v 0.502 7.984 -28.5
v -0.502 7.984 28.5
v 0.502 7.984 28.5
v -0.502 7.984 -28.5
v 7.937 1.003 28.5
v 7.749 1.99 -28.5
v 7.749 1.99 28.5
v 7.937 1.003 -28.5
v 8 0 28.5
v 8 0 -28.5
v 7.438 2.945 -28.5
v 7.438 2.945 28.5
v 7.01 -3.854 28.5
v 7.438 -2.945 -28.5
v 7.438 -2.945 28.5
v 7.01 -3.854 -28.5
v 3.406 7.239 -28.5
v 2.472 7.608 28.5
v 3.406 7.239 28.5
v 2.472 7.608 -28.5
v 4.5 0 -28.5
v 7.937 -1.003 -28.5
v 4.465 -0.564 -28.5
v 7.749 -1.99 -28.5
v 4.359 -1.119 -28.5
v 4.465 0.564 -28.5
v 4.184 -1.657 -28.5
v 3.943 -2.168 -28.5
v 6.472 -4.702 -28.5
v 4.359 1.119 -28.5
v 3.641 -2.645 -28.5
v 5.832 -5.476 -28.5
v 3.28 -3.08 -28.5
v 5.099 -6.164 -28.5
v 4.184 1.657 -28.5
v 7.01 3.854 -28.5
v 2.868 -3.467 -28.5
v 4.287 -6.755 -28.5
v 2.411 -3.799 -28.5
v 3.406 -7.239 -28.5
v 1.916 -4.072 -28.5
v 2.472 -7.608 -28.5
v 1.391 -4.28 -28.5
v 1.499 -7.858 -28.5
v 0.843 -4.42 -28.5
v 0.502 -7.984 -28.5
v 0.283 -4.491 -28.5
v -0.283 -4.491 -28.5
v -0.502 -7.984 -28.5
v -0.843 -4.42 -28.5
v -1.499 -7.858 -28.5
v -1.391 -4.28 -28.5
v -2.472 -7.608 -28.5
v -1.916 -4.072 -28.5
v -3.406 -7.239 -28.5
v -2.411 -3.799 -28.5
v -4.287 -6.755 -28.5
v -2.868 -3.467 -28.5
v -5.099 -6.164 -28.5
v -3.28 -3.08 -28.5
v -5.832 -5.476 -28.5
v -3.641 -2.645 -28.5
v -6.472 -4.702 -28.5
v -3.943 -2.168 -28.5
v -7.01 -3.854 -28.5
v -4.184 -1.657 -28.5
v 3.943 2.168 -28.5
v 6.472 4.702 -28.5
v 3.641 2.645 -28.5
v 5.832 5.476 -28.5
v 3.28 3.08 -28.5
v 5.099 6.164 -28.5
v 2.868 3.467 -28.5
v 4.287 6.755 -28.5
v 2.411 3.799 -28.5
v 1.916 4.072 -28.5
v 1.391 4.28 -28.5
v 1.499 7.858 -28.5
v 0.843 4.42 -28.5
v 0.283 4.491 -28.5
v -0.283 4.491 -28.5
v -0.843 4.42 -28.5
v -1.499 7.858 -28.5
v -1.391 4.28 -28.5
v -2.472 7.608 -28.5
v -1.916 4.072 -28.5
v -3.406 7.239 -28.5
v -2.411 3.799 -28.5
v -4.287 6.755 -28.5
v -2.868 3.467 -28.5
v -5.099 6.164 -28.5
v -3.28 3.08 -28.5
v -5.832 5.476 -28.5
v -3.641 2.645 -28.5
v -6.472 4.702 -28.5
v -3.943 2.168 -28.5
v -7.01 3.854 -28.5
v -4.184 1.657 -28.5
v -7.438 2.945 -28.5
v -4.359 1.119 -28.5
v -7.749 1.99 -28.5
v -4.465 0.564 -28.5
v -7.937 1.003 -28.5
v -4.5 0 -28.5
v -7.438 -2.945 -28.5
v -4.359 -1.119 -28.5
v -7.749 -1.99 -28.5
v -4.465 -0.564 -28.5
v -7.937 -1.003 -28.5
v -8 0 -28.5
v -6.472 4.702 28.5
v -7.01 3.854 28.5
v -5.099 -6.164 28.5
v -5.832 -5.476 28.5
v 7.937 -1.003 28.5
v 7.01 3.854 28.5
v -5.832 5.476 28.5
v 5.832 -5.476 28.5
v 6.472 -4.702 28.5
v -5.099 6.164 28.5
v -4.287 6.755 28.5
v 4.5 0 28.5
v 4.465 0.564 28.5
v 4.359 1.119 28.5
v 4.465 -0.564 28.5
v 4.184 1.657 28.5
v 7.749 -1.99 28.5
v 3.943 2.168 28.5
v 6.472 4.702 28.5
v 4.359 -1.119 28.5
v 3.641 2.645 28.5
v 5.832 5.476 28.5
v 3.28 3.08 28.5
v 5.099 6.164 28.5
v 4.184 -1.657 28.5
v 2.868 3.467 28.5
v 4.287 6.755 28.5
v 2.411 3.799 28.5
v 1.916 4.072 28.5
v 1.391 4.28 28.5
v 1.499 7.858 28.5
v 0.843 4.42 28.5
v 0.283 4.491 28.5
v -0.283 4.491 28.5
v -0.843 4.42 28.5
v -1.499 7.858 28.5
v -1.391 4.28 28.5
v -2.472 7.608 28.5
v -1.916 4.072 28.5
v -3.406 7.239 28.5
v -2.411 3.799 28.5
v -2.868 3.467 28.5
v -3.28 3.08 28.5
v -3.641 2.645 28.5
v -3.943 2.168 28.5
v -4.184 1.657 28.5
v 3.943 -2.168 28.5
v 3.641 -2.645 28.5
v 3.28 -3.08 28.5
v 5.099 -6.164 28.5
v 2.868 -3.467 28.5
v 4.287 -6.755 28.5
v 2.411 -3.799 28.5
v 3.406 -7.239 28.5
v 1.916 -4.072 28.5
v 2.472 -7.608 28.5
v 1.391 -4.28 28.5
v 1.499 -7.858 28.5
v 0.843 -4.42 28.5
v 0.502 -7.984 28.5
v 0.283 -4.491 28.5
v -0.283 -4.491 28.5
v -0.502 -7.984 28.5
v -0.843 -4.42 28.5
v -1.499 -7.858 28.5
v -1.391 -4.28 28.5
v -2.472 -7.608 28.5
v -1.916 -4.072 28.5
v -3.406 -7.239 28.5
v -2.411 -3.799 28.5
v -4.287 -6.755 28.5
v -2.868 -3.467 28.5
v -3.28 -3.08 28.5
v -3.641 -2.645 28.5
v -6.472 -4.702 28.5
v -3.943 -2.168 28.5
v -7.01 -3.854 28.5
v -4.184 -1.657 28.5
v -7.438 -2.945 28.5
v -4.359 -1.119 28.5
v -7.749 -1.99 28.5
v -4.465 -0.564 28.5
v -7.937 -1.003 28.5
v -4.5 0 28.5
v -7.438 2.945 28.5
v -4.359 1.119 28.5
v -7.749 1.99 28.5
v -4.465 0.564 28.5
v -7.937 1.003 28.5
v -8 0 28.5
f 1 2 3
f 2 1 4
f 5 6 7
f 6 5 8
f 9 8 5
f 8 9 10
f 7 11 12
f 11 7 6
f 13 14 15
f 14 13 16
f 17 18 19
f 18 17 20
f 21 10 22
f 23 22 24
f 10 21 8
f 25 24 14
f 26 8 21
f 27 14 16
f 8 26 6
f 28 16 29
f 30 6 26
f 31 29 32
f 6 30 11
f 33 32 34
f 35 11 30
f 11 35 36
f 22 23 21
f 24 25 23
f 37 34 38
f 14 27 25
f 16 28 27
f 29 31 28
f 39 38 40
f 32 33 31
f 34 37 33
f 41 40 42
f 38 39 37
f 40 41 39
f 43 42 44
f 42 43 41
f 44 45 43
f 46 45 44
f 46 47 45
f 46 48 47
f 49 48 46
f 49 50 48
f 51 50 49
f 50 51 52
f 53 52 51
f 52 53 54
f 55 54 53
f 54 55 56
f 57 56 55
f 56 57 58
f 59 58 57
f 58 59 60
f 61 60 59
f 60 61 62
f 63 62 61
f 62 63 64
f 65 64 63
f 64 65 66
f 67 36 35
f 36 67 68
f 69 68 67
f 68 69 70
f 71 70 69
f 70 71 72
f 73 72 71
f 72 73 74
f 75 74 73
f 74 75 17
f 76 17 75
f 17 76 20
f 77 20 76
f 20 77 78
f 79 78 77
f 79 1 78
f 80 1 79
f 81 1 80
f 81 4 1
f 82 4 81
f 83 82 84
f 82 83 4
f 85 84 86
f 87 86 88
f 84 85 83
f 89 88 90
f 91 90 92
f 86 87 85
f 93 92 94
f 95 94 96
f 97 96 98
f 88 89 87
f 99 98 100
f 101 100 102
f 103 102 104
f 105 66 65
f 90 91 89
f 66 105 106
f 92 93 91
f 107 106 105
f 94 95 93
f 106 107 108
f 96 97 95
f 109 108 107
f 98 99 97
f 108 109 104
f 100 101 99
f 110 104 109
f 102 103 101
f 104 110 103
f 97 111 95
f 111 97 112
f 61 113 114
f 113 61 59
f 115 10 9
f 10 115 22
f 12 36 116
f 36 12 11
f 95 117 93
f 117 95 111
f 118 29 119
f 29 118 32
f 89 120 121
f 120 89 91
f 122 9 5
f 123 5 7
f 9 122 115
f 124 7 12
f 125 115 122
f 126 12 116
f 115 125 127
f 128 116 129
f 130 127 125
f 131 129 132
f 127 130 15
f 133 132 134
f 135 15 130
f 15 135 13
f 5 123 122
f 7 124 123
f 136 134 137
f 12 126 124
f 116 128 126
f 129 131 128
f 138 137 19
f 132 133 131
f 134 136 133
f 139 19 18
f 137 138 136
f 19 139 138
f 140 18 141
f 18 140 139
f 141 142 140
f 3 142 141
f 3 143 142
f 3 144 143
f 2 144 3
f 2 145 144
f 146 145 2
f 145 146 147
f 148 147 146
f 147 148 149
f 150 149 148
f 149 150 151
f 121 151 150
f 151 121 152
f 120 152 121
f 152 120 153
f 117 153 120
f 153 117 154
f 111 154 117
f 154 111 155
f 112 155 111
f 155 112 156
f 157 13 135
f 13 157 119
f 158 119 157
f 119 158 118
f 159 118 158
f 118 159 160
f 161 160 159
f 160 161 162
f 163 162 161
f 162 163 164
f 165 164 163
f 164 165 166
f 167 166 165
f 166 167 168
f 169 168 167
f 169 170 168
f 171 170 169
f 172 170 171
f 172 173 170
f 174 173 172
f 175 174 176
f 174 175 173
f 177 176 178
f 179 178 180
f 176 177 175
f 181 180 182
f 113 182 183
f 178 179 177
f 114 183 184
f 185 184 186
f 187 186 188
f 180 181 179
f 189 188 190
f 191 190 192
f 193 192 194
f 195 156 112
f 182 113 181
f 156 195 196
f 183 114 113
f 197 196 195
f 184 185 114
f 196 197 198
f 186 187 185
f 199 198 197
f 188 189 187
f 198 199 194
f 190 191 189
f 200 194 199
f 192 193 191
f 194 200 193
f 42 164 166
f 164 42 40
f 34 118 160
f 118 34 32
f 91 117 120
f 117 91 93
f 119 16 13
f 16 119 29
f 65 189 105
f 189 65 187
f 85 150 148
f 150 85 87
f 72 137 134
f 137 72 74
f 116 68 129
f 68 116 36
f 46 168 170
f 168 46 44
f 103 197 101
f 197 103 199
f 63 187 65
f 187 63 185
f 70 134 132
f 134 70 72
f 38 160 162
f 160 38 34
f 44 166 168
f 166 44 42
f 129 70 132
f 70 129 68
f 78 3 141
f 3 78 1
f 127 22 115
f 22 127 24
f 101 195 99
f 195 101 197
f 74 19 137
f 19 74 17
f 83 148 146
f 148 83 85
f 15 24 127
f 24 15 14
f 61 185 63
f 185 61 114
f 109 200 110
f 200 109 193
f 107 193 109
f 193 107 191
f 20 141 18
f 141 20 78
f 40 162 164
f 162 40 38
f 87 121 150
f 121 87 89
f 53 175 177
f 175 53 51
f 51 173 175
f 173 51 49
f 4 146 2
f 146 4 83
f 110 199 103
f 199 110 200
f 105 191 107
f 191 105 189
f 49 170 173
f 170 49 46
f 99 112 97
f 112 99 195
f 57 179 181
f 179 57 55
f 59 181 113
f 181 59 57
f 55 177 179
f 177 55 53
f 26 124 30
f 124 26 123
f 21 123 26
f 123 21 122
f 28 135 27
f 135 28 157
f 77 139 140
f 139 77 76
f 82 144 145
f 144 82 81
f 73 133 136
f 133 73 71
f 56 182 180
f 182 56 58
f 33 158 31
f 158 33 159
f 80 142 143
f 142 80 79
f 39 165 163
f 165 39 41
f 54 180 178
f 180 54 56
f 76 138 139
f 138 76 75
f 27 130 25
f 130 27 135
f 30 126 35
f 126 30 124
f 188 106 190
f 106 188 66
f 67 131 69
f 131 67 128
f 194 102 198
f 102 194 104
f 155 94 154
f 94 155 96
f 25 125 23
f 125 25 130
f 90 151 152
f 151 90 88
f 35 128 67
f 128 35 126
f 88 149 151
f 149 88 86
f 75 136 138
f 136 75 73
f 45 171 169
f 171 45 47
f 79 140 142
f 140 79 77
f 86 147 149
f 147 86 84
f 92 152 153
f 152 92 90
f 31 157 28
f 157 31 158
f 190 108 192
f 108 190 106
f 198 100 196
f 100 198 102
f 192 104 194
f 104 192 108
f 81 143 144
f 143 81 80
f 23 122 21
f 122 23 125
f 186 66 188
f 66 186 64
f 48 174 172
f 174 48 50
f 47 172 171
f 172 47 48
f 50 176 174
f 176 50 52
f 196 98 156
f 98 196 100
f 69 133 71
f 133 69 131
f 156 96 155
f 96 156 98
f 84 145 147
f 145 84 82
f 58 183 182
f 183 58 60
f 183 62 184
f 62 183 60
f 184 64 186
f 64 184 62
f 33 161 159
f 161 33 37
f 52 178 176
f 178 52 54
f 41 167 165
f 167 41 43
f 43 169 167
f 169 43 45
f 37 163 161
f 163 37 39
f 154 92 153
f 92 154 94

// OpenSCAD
$fn = 50;


difference() {
	union() {
		translate(v = [0, 0, -28.5000000000]) {
			cylinder(h = 57, r = 8.0000000000);
		}
	}
	union() {
		translate(v = [0, 0, -100.0000000000]) {
			cylinder(h = 200, r = 4.5000000000);
		}
	}
}
